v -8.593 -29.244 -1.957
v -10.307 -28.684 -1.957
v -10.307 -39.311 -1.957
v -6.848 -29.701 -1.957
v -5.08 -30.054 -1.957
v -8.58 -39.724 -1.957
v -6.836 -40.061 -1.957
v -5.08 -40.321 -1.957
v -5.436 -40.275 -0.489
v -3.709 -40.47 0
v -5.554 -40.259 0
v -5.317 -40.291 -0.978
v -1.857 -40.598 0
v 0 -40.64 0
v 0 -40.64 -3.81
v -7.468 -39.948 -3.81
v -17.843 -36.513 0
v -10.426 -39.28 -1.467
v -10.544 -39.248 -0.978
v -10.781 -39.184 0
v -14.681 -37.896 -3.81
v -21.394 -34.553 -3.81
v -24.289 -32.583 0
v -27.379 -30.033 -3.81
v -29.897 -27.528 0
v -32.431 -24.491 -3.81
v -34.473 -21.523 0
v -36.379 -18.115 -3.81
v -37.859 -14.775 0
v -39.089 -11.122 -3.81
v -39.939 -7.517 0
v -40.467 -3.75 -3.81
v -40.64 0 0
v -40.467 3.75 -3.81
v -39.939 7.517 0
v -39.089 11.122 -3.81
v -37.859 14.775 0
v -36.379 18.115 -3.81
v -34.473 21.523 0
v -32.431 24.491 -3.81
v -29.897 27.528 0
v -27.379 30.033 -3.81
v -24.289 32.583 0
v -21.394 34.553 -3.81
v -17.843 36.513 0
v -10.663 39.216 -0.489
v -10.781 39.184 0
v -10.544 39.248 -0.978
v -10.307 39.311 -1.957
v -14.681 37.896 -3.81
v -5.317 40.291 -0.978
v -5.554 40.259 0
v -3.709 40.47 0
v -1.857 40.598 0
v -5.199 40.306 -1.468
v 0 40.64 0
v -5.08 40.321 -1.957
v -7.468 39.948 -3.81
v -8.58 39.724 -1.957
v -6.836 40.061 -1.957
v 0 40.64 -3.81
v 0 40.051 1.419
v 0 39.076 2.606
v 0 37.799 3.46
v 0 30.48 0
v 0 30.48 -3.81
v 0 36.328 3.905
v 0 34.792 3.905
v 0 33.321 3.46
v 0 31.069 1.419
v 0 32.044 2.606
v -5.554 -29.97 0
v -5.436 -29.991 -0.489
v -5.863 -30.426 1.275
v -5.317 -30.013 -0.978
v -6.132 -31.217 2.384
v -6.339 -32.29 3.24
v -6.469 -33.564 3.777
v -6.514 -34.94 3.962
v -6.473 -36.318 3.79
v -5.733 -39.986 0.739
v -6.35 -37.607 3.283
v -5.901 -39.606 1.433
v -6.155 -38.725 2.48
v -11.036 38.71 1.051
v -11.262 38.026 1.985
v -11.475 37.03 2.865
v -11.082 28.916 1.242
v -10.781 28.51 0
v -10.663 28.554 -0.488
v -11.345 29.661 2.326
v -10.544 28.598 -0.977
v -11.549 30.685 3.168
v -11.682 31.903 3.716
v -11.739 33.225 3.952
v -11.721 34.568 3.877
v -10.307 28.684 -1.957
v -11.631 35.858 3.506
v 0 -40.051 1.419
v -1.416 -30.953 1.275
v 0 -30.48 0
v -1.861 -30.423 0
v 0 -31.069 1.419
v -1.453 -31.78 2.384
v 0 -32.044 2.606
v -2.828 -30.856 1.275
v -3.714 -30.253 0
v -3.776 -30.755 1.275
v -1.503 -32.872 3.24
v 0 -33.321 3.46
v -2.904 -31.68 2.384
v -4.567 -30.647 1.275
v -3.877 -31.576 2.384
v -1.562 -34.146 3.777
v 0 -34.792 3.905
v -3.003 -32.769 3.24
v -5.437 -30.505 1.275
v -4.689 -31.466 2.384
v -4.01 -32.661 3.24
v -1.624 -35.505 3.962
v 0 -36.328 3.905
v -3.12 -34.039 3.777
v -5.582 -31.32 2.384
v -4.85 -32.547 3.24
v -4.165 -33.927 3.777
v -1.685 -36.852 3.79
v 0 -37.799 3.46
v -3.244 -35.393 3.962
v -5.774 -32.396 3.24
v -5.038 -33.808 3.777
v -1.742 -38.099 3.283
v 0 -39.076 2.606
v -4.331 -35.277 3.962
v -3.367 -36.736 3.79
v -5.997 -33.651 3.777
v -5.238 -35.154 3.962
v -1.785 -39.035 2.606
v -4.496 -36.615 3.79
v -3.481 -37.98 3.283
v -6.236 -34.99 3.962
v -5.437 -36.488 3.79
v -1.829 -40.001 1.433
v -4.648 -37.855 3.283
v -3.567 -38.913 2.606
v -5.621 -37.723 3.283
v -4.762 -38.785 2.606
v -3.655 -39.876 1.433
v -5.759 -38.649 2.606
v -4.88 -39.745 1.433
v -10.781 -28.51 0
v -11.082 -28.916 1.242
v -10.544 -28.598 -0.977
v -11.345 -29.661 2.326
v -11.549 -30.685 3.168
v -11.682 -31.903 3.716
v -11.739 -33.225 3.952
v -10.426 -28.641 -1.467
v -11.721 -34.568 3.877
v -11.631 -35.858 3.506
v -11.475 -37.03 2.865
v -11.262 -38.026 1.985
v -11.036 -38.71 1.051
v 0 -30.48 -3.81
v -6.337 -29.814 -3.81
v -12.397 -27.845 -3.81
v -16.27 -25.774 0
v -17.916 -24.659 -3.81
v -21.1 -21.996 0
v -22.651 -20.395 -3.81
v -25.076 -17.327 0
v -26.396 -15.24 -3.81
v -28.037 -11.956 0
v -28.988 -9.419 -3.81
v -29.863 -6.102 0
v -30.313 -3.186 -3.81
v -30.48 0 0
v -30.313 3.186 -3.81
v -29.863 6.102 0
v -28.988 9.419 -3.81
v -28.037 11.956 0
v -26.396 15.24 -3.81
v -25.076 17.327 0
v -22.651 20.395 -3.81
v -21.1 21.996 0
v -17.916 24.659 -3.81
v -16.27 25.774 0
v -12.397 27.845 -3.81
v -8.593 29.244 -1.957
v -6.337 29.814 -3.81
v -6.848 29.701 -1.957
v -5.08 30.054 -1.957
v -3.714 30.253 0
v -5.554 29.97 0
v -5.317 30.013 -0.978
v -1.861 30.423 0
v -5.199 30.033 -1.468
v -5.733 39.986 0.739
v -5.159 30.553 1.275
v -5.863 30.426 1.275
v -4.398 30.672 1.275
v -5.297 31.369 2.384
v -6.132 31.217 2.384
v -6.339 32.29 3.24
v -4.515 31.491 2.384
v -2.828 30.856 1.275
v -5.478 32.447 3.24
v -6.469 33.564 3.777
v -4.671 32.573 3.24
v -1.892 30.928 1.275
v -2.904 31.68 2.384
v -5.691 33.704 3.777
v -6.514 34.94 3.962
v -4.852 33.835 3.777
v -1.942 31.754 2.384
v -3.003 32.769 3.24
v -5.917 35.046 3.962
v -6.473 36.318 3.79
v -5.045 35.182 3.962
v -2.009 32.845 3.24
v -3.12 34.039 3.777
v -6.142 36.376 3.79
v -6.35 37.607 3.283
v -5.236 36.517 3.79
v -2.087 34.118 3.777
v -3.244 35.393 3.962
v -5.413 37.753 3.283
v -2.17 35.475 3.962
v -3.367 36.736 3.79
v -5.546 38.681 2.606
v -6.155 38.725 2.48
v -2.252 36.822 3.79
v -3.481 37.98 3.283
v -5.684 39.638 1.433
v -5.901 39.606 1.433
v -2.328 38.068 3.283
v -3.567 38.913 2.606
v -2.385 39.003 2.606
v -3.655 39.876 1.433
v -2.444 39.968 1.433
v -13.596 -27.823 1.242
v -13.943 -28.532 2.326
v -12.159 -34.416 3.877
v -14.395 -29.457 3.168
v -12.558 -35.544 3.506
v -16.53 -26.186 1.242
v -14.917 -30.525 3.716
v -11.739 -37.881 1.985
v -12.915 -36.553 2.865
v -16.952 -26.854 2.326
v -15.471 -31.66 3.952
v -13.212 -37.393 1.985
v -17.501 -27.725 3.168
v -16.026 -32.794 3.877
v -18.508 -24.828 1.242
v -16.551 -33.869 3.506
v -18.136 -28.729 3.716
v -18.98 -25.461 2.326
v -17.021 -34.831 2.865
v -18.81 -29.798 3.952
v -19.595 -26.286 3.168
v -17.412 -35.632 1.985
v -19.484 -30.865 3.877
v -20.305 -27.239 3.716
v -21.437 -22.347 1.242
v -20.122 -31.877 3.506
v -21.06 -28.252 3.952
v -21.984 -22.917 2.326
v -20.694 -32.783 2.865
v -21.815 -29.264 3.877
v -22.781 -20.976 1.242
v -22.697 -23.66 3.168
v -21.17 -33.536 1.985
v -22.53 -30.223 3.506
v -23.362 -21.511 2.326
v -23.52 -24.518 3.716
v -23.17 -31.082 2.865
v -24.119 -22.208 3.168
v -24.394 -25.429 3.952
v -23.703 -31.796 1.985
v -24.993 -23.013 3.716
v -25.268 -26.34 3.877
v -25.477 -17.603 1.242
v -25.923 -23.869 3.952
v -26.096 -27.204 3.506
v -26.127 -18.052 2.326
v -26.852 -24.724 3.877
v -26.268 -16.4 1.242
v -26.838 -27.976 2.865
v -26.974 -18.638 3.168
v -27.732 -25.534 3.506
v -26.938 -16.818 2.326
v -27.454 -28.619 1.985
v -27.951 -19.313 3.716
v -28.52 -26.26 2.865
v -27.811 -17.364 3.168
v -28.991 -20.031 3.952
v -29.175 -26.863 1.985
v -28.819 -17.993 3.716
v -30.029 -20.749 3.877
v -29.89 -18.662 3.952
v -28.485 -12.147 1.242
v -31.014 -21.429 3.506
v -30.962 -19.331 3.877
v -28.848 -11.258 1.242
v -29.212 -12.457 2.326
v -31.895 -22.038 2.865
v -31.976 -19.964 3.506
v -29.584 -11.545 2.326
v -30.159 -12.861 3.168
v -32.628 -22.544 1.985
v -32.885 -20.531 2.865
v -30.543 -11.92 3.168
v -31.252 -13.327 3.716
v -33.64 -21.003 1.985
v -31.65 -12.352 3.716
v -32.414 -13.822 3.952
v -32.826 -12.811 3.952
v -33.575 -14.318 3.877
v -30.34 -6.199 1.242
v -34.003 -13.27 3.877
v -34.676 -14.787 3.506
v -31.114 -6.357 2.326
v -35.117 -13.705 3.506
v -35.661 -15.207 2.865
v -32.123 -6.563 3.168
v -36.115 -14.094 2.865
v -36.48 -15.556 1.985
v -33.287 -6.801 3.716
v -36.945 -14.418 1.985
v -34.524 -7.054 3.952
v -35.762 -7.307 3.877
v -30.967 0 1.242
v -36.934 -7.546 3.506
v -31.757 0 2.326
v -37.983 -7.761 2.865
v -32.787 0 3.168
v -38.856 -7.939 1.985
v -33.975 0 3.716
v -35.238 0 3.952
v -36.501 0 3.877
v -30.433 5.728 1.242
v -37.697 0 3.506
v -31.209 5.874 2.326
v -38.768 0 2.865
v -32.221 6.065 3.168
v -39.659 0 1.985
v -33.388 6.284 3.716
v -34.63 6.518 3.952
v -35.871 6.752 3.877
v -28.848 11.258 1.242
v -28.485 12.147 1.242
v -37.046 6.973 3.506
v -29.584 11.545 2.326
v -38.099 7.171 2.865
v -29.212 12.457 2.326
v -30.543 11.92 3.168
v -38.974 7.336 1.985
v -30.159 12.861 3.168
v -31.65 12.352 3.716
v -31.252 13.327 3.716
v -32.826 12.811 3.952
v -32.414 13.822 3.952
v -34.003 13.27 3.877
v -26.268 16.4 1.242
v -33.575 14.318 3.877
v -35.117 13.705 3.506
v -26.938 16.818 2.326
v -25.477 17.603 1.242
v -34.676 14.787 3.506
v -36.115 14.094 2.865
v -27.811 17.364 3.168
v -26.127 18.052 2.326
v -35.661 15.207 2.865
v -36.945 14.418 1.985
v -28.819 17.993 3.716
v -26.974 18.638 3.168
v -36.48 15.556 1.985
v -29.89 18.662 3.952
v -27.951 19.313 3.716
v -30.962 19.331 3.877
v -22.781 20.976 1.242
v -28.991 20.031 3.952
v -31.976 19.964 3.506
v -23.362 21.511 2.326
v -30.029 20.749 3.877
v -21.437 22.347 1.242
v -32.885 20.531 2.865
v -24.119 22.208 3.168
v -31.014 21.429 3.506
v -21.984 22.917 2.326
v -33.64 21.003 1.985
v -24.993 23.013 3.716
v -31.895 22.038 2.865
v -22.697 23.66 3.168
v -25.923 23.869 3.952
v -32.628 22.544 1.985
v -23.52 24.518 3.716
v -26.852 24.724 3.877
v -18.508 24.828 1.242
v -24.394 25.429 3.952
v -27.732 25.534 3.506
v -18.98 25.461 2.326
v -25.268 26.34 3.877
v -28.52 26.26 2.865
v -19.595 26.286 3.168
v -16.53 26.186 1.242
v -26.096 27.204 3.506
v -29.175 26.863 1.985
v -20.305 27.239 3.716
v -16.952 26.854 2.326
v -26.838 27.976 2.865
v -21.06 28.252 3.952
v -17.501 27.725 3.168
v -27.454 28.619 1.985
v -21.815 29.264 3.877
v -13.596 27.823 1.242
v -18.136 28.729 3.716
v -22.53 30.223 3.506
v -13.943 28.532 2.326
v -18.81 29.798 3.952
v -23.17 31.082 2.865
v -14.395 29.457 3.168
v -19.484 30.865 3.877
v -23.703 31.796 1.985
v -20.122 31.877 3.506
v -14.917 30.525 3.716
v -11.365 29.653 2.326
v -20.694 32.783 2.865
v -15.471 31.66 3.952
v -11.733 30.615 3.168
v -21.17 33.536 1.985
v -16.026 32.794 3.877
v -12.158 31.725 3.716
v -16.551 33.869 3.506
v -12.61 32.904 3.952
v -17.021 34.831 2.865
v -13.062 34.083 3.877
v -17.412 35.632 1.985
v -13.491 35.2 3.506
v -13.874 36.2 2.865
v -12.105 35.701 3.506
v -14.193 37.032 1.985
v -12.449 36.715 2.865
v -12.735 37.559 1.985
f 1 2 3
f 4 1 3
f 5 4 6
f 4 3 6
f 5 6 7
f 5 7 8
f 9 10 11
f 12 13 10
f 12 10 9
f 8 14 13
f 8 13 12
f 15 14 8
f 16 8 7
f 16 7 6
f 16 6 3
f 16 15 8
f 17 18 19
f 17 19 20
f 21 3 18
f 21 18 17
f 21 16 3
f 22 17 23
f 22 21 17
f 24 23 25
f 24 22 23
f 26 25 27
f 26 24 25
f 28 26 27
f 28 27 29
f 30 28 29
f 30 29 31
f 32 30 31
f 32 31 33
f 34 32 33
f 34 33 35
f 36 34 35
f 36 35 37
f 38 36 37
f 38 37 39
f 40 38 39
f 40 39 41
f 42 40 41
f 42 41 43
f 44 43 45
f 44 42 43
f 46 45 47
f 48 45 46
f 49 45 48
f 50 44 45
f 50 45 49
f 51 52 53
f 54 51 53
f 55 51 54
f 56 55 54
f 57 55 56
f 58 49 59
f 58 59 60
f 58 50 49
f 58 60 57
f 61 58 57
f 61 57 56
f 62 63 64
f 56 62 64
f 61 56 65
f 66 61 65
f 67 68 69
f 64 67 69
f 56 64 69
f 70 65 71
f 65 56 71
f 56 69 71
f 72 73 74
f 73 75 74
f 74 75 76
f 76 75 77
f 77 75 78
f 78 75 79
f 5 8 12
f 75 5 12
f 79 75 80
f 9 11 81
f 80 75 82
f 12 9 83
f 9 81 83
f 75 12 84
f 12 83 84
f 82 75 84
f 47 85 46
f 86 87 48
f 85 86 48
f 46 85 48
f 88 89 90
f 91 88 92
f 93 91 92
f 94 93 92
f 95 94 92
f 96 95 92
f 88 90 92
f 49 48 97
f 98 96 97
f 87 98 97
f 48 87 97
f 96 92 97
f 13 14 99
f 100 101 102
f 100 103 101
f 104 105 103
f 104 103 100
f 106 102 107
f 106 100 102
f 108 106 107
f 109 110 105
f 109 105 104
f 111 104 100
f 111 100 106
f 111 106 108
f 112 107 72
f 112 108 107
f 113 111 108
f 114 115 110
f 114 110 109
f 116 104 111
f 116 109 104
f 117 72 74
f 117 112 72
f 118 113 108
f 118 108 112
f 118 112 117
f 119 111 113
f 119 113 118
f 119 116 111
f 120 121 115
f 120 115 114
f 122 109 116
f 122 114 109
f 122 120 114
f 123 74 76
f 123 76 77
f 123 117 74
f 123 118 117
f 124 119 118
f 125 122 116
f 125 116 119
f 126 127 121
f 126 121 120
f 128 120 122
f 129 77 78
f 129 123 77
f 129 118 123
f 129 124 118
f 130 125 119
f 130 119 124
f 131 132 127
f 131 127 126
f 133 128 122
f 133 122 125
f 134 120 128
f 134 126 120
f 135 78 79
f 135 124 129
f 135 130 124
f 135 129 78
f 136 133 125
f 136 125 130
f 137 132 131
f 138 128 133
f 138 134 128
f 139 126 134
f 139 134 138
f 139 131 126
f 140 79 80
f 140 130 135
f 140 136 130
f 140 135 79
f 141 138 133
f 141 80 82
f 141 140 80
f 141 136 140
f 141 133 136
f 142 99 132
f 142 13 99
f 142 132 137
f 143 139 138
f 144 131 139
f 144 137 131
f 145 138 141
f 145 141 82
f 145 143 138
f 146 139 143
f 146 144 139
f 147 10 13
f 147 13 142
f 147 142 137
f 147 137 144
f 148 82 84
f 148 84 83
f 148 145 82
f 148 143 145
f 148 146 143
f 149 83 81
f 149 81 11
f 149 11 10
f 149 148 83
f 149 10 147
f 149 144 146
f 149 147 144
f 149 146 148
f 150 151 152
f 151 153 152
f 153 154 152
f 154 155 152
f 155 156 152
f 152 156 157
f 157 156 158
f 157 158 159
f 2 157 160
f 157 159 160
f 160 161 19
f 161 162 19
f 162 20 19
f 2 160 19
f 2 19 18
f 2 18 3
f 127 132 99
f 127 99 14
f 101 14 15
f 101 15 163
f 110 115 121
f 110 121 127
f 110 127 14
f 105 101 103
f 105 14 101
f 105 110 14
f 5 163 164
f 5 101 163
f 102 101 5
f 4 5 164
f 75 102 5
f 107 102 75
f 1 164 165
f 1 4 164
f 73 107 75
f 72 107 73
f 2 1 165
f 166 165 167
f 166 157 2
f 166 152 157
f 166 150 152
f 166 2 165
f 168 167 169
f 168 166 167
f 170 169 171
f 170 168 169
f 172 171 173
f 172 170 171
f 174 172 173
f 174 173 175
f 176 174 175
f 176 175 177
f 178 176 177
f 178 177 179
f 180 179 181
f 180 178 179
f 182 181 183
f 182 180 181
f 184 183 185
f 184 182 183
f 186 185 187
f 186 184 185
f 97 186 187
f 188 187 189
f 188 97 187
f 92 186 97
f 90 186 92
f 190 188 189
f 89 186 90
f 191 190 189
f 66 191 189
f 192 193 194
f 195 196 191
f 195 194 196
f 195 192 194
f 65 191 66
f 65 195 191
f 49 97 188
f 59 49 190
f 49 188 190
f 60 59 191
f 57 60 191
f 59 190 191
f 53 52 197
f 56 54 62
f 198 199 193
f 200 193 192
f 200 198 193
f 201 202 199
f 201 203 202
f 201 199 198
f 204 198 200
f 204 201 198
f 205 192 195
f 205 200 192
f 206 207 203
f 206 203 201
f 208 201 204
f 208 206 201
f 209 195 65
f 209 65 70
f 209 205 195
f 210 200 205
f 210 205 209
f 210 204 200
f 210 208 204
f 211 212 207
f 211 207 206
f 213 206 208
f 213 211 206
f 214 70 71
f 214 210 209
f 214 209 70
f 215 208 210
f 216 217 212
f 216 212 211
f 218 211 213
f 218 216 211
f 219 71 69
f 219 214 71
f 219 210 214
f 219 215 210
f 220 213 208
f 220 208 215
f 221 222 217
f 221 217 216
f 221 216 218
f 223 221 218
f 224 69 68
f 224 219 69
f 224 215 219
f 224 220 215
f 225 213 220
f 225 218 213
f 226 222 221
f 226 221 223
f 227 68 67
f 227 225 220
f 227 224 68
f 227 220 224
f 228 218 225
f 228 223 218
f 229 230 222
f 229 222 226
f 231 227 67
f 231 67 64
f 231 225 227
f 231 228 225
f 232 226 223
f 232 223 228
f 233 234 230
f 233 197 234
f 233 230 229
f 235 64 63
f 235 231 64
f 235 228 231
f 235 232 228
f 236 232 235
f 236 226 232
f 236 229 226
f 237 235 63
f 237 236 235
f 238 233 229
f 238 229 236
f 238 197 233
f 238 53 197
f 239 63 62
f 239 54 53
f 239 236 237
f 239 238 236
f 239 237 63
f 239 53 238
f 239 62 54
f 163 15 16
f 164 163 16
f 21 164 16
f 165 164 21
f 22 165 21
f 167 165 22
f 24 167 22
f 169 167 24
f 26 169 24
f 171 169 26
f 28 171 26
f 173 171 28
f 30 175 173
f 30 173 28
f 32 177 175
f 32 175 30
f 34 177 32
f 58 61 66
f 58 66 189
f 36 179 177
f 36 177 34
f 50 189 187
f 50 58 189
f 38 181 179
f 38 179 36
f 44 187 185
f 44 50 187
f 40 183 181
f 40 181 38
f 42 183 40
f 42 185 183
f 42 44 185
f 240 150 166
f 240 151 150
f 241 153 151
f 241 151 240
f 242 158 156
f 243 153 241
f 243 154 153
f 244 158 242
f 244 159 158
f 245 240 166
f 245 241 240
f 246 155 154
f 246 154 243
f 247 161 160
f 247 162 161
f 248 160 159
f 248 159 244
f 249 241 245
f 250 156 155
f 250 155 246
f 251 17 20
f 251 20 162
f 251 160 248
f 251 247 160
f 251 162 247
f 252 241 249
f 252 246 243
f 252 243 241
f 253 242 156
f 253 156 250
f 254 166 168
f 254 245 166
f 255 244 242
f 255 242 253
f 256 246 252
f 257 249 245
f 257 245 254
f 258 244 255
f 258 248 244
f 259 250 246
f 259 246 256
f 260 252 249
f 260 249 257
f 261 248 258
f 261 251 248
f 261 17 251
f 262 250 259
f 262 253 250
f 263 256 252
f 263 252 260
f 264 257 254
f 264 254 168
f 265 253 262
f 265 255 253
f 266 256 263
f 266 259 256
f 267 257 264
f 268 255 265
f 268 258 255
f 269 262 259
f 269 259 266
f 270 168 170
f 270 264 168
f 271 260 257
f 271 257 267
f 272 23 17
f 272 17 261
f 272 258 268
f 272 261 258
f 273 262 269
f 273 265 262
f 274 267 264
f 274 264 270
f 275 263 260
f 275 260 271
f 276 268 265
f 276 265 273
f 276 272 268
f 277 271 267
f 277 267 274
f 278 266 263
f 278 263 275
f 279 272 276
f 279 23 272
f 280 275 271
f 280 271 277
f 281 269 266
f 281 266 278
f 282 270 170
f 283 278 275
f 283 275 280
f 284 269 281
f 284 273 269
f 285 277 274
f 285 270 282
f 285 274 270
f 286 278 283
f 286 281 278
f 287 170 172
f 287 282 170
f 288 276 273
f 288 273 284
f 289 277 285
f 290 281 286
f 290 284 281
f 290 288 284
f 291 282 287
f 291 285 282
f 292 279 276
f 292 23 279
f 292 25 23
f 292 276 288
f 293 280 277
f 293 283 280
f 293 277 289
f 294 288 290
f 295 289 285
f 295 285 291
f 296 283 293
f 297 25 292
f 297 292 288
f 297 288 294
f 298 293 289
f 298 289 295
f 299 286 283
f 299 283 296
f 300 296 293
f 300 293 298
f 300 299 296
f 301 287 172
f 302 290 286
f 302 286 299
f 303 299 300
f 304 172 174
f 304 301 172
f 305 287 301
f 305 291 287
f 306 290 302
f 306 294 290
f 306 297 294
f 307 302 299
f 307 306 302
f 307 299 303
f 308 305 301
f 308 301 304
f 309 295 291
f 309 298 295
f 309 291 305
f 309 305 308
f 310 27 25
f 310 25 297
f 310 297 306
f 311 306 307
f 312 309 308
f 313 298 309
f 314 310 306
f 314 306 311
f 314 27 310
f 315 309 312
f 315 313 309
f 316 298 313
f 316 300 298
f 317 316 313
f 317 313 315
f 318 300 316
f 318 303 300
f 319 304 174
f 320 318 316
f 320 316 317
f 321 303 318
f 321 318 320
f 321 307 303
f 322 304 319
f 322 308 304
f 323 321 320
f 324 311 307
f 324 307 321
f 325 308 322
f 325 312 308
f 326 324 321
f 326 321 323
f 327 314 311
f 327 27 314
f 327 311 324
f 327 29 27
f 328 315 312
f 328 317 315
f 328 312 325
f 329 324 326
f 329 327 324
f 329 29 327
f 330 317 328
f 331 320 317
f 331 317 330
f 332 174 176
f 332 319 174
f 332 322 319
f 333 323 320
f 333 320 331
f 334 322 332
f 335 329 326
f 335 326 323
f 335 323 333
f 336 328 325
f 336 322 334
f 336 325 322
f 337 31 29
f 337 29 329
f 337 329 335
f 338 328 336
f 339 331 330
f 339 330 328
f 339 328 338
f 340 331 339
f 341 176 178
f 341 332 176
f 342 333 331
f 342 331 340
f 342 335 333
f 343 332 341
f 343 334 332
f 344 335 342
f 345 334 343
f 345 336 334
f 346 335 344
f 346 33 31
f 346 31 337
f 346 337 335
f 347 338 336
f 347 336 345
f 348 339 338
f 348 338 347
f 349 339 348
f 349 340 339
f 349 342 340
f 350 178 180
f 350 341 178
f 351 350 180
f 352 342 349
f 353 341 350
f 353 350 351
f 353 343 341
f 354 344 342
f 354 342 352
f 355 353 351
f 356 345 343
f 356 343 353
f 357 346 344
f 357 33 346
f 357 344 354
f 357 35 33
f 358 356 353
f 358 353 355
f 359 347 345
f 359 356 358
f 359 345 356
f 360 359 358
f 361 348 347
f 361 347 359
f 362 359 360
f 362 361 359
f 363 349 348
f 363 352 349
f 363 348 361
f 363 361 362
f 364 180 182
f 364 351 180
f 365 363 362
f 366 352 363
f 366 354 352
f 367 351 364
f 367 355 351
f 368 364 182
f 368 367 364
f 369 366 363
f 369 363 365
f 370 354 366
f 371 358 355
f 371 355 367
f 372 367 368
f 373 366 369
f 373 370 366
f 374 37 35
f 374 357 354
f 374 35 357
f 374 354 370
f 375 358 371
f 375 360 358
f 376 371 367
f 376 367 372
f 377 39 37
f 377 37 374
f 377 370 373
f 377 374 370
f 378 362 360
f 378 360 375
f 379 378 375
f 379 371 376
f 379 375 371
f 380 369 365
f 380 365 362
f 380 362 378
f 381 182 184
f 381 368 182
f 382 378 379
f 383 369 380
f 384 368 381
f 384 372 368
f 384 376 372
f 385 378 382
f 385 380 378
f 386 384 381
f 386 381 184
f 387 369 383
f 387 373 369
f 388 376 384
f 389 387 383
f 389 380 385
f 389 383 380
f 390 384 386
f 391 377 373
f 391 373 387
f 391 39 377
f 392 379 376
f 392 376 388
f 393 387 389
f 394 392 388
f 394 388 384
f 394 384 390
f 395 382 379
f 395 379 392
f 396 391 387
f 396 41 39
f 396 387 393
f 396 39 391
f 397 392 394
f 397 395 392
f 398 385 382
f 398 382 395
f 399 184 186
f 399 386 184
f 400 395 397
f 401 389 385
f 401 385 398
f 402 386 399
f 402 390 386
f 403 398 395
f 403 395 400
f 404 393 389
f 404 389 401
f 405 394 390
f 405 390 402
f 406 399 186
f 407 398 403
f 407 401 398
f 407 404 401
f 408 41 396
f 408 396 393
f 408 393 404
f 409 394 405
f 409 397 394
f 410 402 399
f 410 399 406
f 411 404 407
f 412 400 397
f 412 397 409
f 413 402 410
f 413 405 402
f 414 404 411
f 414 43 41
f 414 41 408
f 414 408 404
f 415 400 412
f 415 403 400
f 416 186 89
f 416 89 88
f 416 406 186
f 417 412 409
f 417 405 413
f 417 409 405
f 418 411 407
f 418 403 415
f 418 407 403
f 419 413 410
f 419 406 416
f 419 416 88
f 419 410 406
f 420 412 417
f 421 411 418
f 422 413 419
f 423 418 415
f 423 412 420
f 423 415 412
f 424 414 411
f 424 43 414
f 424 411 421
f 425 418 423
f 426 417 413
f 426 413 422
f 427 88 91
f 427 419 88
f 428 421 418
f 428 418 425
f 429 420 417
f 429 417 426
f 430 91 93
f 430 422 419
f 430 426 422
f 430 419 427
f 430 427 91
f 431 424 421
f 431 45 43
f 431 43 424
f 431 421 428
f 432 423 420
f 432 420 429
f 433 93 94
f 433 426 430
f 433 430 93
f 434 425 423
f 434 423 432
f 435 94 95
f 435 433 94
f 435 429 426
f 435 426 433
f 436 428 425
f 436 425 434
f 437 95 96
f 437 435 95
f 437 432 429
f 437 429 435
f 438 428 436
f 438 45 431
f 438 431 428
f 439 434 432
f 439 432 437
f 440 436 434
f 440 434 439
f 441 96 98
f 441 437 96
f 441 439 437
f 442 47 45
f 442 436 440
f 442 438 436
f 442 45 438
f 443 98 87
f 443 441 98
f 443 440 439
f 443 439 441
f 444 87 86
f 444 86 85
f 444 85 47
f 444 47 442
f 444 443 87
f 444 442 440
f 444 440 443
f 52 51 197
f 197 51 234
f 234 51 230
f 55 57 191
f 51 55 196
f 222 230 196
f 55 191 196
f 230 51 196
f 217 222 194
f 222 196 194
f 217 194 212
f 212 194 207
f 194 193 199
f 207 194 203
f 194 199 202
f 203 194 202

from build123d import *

# Parameters (mm, degrees)
F1_ANGLE = 180
F3_DEPTH = 76.2


with BuildPart() as f1:
    # F0 (on Front) → F1 (revolve, symmetric)
    with BuildSketch(Plane.XZ) as f1_sk:
        with BuildLine():
            Line((-30.48, -3.81), (-30.48, 0))
            ThreePointArc((-30.48, 0), (-35.56, 3.962134), (-40.64, 0))
            Line((-40.64, 0), (-40.64, -3.81))
            Line((-40.64, -3.81), (-30.48, -3.81))
        make_face()
    revolve(axis=Axis((0, 0, 31.664096), (0, 0, 1)), revolution_arc=F1_ANGLE / 2)
    revolve(f1_sk.sketch, axis=Axis((0, 0, 31.664096), (0, 0, -1)), revolution_arc=F1_ANGLE / 2)

    # F2 (on Front) → F3 (cut, symmetric)
    with BuildSketch(Plane.XZ):
        Polygon((-5.08, -1.957448), (-8.953226, 14.028987), (-13.816583, 12.528193), (-10.306973, -1.957448), align=None)
    extrude(amount=F3_DEPTH, both=True, mode=Mode.SUBTRACT)


solid = f1.part
